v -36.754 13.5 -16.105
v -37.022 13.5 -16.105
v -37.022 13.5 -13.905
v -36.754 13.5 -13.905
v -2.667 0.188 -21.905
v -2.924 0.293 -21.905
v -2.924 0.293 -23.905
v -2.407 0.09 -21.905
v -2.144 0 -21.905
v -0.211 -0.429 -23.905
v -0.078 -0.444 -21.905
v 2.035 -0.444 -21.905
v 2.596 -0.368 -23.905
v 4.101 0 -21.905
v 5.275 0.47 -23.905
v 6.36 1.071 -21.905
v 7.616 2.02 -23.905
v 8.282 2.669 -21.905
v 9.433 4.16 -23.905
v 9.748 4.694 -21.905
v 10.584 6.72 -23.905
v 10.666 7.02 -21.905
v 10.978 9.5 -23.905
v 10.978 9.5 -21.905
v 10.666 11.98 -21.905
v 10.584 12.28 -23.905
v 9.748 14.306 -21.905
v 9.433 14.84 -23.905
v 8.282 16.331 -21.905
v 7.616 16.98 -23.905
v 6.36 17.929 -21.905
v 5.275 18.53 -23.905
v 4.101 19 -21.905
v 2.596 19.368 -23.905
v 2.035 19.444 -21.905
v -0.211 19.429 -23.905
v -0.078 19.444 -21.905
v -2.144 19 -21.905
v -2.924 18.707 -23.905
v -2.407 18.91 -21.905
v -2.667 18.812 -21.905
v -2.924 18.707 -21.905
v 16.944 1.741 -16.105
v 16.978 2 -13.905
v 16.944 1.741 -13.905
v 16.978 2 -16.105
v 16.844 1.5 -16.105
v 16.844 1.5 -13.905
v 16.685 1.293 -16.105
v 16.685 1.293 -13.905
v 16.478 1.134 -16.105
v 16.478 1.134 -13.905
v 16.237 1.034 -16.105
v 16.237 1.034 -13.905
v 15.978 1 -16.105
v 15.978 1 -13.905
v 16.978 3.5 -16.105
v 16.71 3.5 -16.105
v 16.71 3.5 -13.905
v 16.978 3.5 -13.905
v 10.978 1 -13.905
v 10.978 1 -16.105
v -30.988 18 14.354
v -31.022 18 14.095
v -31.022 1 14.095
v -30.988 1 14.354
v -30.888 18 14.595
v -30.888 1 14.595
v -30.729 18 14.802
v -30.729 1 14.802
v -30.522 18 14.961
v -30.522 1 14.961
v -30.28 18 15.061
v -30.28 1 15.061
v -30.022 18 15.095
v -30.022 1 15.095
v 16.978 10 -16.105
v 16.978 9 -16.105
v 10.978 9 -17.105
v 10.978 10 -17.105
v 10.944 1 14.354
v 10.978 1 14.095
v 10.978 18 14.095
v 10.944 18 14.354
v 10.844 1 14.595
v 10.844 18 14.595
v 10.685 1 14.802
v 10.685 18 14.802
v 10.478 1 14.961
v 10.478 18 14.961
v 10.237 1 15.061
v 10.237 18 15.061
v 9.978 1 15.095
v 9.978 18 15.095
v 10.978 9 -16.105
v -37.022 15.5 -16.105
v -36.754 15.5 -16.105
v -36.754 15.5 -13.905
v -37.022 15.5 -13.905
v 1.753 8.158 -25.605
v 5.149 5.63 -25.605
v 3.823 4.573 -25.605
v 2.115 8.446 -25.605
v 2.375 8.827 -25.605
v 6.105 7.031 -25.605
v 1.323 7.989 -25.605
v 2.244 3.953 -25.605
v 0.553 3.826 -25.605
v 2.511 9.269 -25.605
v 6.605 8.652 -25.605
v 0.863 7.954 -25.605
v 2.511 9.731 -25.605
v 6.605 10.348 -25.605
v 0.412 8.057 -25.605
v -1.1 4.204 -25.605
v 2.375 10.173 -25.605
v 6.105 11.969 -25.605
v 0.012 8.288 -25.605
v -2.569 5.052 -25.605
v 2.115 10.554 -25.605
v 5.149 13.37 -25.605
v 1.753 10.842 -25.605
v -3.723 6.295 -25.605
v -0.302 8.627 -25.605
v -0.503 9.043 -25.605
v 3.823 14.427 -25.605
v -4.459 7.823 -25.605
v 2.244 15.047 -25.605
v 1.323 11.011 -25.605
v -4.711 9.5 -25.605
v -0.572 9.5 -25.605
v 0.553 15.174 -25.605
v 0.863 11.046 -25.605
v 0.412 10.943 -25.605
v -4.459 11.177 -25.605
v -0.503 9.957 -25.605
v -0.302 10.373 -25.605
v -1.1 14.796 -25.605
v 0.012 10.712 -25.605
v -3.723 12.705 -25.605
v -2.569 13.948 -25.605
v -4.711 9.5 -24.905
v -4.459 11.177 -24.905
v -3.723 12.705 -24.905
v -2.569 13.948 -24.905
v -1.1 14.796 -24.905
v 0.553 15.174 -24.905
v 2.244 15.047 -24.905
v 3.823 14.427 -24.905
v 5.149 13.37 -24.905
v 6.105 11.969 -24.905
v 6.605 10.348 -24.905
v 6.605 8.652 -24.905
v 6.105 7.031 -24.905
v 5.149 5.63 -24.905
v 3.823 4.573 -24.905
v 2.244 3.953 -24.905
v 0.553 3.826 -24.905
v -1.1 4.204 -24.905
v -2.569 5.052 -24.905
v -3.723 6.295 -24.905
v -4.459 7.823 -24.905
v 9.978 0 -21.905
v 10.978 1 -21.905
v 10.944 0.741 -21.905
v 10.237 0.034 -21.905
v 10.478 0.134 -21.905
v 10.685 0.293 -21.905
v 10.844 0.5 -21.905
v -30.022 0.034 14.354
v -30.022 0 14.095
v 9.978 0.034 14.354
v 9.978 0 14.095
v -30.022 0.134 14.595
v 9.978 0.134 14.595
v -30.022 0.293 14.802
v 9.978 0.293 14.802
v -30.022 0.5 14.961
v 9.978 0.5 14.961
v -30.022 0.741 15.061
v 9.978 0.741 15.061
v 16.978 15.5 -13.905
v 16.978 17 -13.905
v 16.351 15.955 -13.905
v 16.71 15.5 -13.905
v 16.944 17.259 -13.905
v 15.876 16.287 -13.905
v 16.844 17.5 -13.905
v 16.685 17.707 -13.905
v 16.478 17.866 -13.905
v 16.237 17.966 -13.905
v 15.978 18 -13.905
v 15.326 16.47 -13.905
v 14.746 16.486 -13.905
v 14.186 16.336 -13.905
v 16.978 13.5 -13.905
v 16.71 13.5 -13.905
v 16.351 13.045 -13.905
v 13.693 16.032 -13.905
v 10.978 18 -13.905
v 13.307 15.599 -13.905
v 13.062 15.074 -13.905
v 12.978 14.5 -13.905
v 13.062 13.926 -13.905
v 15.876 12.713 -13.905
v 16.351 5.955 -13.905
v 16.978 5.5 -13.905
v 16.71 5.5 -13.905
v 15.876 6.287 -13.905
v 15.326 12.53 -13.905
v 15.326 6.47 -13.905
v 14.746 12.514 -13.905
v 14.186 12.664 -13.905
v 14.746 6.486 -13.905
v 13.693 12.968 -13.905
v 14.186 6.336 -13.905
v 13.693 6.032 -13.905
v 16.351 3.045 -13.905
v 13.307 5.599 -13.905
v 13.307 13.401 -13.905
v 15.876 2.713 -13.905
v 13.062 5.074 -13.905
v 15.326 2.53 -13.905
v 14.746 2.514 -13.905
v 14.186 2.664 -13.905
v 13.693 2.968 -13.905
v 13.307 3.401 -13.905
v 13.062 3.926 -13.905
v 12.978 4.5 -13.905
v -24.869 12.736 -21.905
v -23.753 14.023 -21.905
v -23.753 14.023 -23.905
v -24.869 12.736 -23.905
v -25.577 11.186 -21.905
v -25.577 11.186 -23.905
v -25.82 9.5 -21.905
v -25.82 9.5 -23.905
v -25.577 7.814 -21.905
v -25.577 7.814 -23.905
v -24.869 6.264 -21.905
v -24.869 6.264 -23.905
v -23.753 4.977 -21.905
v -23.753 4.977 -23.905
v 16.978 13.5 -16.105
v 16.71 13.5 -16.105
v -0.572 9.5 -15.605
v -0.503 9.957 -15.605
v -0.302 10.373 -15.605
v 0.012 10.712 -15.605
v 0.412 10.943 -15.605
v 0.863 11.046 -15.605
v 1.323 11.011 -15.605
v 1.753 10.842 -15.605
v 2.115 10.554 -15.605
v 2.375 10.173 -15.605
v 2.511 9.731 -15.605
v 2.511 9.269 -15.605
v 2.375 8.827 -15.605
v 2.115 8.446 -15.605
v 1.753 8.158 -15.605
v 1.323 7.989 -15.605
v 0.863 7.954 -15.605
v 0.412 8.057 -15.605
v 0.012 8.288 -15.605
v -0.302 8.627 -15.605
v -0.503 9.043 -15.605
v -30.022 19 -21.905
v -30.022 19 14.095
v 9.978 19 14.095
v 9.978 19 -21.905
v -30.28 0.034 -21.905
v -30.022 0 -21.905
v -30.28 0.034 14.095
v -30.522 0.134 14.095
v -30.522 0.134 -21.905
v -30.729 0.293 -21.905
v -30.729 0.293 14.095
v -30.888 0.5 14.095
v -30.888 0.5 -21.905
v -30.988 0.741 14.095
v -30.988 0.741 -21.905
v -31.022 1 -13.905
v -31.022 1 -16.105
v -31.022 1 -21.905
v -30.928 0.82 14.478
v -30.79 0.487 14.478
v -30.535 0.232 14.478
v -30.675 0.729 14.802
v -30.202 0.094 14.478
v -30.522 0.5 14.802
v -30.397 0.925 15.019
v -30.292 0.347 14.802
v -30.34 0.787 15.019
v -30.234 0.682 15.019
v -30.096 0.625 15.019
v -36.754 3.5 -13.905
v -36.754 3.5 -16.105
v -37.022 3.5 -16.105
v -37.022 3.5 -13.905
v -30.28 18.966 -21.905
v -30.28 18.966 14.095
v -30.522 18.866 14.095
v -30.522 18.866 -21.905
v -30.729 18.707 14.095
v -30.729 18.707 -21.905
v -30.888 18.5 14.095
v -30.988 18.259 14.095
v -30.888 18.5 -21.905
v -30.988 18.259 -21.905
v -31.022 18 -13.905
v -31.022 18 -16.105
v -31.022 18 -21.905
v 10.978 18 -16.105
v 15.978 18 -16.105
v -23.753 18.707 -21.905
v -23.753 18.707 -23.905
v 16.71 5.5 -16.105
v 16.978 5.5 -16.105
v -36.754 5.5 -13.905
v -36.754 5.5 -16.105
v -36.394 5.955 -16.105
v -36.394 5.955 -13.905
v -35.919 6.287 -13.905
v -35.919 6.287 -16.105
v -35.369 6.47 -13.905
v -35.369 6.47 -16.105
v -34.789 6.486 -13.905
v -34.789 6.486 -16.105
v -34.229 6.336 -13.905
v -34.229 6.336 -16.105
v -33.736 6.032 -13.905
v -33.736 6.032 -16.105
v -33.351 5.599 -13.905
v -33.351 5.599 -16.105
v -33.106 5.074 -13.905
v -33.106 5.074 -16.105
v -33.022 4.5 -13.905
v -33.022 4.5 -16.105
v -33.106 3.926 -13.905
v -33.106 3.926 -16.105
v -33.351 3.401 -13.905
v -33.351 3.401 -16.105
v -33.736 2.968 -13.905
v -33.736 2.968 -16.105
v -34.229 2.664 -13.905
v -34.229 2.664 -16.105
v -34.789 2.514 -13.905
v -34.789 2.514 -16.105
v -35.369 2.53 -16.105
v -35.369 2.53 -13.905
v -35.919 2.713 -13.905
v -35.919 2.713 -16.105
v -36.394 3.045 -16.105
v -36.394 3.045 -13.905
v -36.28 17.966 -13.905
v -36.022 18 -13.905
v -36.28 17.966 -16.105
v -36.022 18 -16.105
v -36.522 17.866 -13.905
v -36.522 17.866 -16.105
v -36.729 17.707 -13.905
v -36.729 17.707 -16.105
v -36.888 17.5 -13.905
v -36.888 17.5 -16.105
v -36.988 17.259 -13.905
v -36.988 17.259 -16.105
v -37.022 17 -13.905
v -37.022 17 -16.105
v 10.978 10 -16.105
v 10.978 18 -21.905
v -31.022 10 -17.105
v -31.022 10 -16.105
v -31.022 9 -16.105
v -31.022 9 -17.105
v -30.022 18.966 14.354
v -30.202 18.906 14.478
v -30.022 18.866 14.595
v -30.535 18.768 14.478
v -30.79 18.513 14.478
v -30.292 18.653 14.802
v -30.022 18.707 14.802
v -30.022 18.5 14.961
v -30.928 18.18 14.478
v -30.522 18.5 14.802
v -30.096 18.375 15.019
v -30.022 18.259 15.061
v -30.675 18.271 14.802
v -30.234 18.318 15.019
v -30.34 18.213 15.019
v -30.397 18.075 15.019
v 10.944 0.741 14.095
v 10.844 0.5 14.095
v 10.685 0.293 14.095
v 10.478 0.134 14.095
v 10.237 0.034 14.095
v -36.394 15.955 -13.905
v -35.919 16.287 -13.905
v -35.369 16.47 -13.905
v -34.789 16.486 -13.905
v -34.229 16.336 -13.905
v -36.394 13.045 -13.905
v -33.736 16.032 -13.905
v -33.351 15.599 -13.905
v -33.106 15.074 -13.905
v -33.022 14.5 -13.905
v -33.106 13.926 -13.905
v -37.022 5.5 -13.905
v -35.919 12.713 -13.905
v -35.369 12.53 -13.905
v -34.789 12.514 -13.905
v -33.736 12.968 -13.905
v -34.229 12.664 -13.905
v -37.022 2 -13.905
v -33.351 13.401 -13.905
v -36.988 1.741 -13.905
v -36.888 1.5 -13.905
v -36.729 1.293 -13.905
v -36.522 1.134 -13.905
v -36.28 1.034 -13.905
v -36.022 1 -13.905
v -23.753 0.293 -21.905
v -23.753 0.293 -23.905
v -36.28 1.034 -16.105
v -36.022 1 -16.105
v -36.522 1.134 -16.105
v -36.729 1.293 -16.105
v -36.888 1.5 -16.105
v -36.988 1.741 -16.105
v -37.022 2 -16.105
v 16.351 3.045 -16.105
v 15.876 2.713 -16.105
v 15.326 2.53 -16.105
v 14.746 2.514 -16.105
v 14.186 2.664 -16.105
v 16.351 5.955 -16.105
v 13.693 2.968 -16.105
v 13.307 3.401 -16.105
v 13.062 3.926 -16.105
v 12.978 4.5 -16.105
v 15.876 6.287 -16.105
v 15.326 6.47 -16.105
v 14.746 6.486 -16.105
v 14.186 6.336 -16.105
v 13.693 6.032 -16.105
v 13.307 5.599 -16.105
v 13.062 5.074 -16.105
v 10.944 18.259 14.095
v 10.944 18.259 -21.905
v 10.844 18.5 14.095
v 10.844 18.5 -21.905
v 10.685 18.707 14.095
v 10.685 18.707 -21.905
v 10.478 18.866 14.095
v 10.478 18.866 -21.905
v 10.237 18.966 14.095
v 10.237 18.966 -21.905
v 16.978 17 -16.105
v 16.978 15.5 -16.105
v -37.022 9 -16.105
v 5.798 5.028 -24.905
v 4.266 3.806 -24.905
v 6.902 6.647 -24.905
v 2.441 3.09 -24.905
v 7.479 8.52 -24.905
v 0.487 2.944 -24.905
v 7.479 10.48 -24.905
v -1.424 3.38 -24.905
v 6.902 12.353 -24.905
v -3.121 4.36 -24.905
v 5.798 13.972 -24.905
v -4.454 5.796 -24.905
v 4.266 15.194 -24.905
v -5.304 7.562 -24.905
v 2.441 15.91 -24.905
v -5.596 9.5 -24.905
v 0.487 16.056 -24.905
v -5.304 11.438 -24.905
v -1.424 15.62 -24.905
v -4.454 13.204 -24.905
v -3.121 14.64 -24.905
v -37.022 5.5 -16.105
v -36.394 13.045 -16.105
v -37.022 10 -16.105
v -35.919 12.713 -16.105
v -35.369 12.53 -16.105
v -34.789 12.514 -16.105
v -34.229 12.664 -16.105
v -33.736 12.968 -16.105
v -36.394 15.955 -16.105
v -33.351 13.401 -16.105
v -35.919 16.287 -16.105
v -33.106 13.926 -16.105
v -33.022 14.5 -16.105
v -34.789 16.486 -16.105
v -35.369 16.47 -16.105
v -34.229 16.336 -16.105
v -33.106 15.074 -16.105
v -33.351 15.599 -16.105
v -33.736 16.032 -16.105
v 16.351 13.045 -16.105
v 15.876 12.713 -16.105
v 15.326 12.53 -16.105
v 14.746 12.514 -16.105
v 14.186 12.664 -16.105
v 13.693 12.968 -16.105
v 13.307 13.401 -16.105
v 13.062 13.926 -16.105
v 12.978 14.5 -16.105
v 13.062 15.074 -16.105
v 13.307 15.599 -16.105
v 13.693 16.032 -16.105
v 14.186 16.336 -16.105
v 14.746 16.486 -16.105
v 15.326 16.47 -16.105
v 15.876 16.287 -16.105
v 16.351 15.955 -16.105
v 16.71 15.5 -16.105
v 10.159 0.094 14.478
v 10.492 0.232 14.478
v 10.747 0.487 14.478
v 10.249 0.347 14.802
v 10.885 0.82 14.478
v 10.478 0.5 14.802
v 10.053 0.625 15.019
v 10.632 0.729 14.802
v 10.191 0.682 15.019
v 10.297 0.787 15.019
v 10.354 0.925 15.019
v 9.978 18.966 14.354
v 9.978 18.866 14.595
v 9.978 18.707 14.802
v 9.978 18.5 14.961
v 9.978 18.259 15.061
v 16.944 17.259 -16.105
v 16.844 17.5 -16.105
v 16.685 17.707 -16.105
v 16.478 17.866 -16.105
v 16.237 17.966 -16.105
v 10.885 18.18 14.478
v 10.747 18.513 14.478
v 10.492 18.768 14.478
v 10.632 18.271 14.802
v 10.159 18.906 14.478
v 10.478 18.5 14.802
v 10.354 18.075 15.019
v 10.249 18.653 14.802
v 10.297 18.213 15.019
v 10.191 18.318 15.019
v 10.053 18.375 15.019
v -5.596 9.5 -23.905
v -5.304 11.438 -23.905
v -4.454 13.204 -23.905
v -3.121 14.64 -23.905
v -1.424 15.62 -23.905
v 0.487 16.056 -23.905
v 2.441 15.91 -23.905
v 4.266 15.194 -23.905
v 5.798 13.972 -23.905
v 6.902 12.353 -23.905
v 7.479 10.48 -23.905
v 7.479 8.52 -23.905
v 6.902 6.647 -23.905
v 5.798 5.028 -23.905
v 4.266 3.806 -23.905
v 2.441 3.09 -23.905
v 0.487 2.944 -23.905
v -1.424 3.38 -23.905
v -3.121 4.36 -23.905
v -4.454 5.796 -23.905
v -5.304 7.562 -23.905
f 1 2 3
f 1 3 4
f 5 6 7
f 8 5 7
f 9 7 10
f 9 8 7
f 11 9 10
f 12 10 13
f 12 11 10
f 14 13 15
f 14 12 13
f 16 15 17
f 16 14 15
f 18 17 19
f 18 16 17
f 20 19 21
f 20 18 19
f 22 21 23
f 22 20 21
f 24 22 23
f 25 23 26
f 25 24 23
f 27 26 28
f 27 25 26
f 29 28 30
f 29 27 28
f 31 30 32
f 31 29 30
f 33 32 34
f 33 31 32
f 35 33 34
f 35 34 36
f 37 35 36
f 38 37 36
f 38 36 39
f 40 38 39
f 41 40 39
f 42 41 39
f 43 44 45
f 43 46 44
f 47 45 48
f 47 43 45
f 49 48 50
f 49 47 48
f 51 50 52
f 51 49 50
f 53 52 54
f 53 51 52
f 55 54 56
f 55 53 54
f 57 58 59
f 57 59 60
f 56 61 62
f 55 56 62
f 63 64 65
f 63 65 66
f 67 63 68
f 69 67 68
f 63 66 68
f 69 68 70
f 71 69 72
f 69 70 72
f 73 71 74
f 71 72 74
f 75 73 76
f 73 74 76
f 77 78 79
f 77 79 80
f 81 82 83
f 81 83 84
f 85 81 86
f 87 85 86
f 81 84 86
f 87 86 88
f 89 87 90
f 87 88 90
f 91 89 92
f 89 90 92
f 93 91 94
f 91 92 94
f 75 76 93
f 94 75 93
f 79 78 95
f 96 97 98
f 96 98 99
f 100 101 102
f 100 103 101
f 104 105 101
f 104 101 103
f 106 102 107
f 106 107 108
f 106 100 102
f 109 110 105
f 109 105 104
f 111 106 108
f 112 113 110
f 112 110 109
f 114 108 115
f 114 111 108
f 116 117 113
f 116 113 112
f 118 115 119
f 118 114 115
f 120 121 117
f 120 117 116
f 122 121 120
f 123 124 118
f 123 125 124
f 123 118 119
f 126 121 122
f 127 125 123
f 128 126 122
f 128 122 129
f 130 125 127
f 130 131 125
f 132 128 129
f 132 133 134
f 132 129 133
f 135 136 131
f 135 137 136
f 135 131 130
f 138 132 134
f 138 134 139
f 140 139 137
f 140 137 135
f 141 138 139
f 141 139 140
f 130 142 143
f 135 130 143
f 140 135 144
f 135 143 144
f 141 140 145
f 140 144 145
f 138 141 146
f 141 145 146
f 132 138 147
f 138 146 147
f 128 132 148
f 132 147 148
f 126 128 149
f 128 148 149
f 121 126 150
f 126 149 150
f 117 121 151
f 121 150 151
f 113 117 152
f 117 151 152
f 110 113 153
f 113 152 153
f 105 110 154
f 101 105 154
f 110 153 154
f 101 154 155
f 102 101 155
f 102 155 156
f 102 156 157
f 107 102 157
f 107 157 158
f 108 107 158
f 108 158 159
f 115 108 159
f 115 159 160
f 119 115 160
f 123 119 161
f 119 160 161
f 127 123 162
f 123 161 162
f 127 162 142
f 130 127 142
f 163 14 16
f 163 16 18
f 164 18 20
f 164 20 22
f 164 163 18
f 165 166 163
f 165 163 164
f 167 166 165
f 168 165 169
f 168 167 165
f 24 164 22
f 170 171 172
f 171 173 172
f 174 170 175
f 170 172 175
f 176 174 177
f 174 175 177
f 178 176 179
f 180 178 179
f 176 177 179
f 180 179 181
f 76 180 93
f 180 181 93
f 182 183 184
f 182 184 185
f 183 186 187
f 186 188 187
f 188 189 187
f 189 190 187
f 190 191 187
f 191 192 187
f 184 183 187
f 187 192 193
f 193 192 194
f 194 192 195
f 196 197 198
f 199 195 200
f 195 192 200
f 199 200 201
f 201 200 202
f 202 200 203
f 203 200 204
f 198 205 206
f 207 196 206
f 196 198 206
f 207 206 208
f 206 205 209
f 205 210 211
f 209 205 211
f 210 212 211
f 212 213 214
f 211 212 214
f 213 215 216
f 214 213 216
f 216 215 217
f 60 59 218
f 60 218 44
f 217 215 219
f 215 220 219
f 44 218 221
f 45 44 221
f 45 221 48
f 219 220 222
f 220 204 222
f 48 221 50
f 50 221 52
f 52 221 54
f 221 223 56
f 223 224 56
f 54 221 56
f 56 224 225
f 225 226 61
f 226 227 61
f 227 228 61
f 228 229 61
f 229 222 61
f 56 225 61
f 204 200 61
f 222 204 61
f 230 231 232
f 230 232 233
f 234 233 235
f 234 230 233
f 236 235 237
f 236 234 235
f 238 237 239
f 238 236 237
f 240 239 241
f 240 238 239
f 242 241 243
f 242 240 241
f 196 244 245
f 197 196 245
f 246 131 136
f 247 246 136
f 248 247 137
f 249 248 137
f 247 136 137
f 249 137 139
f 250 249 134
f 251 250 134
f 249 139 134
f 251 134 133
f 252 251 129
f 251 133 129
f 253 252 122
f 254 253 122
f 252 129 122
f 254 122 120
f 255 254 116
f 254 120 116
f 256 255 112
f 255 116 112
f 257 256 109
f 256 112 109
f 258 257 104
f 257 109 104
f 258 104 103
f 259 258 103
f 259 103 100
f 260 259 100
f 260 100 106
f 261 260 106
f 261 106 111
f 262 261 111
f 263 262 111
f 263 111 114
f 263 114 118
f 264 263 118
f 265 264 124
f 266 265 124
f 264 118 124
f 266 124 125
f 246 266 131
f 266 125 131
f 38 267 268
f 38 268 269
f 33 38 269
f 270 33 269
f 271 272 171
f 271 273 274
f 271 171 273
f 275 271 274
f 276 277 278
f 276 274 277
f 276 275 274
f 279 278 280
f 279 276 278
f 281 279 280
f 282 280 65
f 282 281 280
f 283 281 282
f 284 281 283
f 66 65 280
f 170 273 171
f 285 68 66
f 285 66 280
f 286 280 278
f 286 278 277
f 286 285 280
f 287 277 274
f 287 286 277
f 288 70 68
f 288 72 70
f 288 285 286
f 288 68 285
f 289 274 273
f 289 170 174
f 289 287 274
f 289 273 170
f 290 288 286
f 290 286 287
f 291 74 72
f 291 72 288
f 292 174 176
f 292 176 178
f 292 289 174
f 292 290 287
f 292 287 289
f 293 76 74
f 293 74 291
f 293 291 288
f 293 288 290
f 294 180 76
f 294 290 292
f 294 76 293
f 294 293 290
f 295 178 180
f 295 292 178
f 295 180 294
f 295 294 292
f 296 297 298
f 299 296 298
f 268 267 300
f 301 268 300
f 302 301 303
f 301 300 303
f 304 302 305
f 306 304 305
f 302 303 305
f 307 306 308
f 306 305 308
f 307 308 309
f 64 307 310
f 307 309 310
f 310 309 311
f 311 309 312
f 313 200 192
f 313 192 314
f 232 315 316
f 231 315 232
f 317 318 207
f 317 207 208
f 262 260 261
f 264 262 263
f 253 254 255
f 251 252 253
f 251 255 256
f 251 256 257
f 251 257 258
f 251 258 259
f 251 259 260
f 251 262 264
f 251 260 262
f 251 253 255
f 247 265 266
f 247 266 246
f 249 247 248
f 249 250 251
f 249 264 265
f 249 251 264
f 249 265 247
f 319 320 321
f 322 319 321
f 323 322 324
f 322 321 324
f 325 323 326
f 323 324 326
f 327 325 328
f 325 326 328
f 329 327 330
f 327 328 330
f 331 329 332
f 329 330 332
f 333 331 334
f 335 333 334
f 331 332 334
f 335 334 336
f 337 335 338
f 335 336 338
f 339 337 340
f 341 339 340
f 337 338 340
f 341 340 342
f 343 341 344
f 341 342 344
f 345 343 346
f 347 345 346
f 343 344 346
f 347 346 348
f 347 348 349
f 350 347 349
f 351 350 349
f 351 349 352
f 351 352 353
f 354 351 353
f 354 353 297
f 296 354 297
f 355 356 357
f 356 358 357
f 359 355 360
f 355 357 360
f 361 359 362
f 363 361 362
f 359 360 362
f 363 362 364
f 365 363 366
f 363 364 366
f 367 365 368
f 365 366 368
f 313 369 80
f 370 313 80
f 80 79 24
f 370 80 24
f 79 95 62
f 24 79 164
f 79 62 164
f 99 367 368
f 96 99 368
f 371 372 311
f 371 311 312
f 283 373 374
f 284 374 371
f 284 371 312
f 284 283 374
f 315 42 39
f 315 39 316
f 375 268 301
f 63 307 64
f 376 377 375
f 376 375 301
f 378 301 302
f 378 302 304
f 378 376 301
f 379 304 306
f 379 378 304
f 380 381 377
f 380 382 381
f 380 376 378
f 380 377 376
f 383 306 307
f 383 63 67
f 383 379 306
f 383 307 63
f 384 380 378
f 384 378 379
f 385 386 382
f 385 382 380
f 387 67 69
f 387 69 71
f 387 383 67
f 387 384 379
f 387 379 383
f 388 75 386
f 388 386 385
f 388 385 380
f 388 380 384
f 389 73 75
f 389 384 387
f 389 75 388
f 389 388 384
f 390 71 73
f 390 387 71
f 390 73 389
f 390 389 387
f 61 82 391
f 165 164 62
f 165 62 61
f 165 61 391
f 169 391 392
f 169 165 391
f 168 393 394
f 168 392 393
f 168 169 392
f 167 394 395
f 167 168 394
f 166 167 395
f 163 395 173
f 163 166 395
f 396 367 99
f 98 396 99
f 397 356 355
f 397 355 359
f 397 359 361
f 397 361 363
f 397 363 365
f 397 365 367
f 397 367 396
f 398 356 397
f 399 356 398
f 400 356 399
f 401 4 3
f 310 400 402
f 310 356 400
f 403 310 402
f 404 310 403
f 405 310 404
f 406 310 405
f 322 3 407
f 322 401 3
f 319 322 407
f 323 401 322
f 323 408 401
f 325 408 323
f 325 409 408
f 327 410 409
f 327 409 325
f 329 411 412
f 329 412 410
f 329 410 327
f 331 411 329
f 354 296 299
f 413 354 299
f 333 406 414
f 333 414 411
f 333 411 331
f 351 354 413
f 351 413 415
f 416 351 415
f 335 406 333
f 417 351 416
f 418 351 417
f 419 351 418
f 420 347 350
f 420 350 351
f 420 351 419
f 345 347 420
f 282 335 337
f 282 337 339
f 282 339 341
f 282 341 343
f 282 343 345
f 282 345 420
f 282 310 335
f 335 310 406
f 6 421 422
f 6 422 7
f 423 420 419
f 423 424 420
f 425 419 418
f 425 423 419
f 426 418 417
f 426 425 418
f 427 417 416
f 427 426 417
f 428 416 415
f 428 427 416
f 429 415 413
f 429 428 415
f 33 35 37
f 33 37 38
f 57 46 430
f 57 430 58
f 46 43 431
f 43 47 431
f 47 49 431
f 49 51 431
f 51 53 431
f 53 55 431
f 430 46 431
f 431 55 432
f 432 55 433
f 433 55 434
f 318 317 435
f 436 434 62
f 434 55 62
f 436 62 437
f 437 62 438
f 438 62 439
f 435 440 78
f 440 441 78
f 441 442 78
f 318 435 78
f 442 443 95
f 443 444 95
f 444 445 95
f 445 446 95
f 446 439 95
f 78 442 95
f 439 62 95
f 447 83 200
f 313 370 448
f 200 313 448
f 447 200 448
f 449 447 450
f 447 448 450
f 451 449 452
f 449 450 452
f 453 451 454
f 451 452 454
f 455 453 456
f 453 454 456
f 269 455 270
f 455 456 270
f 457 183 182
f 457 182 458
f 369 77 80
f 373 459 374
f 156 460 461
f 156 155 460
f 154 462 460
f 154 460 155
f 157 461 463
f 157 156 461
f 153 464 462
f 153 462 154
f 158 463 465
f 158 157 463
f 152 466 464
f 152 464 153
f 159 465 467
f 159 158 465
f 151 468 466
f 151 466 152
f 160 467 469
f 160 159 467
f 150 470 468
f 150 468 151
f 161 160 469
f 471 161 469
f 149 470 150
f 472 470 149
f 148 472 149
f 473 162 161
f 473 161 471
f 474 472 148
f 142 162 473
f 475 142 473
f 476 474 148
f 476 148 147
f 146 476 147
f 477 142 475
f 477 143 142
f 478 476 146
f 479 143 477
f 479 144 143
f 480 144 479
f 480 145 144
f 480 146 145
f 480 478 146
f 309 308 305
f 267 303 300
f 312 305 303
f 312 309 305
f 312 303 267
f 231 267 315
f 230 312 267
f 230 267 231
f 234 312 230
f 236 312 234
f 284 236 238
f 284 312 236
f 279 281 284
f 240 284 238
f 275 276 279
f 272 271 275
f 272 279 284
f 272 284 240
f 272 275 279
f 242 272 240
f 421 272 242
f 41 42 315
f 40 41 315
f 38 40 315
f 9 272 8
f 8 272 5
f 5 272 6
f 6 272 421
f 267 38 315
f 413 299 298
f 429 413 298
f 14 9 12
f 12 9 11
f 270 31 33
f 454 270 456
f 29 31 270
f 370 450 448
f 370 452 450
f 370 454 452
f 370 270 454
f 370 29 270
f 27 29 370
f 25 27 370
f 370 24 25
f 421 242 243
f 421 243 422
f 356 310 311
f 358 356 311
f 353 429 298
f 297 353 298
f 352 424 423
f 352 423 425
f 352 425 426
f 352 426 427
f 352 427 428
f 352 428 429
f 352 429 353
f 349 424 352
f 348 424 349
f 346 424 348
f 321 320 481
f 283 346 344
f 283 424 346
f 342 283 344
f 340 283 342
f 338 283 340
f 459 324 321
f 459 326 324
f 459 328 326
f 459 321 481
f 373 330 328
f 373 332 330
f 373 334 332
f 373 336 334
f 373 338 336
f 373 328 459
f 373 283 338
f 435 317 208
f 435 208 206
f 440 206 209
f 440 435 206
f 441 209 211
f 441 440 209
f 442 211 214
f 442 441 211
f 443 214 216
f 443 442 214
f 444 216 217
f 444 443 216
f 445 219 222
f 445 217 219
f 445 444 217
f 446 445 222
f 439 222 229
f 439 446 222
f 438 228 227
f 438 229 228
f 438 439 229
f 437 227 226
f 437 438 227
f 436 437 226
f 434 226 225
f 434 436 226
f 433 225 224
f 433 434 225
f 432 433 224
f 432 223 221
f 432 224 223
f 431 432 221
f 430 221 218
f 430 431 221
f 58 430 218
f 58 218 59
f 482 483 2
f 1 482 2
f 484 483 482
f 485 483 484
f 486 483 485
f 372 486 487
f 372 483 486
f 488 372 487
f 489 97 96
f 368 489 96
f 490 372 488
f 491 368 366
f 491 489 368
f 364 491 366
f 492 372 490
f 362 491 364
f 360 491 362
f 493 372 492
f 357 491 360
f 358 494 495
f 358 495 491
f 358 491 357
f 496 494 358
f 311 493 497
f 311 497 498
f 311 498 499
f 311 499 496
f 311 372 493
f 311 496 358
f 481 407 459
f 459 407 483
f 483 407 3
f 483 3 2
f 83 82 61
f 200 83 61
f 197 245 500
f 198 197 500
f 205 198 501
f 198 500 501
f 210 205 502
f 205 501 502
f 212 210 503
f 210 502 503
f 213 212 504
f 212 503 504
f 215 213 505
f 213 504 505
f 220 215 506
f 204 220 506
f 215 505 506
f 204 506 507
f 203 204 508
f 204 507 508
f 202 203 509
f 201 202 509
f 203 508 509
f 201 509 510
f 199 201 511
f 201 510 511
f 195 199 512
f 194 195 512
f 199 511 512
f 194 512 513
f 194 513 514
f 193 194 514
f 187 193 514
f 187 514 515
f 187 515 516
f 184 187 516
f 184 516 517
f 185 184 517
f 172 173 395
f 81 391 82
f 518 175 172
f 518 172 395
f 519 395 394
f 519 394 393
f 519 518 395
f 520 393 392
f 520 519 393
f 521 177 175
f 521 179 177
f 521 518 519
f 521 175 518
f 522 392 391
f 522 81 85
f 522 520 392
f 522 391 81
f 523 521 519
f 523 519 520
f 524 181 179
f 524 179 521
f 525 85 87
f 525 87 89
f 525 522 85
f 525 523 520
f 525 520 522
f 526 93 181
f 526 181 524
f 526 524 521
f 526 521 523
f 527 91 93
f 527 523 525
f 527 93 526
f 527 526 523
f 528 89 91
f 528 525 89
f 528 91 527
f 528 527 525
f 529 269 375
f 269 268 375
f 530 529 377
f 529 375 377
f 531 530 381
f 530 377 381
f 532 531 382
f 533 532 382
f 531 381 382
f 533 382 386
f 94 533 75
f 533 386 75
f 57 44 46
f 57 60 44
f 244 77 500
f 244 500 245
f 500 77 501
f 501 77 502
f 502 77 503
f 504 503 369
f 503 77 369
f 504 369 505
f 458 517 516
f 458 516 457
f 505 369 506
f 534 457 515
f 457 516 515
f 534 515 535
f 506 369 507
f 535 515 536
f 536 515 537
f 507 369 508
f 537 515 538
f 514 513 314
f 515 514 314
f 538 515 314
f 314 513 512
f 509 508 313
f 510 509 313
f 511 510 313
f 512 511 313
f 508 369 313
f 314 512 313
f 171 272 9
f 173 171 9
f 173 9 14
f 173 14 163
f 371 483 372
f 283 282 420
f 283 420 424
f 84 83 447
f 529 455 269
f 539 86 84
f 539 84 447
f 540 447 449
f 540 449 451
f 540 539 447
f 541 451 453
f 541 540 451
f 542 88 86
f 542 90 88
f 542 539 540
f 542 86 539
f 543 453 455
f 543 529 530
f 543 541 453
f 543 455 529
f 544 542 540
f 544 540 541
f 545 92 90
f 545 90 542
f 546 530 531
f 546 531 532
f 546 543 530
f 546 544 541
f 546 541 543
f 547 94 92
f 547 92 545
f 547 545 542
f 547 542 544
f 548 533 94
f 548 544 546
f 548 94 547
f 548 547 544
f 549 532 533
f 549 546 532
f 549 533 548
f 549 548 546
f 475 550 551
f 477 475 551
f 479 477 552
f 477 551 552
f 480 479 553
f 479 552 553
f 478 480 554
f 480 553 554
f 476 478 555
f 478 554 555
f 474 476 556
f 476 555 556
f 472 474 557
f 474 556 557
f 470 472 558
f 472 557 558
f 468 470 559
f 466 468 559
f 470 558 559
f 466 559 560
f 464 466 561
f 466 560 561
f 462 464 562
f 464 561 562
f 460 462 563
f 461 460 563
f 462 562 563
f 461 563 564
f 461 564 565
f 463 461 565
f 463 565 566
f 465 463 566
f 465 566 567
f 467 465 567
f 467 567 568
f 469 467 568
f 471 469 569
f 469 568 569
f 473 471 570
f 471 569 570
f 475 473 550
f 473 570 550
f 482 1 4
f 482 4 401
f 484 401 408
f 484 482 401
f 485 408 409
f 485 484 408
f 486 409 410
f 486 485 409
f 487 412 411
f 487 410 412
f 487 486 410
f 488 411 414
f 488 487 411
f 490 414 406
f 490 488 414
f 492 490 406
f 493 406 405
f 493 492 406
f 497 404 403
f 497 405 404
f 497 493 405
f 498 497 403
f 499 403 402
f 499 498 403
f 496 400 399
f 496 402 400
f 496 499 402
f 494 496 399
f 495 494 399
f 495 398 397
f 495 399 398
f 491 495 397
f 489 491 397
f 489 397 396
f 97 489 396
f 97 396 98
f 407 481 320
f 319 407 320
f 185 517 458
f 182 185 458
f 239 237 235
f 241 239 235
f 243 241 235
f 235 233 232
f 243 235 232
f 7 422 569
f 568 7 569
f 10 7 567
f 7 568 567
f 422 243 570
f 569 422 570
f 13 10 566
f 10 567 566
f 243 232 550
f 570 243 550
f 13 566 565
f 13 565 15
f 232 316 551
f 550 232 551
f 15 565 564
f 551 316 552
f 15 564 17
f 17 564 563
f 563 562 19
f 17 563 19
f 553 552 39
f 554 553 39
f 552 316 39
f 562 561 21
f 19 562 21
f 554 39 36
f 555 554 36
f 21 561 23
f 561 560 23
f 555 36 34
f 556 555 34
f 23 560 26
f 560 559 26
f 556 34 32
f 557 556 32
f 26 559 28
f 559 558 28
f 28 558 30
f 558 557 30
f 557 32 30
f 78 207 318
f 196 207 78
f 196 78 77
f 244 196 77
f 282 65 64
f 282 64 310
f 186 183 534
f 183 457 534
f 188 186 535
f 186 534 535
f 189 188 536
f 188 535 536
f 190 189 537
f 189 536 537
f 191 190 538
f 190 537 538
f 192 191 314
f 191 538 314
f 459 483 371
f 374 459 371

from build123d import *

# Parameters (mm, degrees)
SKETCH2_W            = 42
SKETCH2_H            = 37
BOSS_EXTRUDE1_DEPTH  = 19
FILLET1_R            = 1
FILLET2_R            = 1
SKETCH3_W            = 2.2
SKETCH3_H            = 8.5
BOSS_EXTRUDE2_DEPTH  = 6
SKETCH4_W            = 6
SKETCH4_H            = 1
BOSS_EXTRUDE3_DEPTH  = 1
CHAMFER1_SIZE2       = 1
CHAMFER1_SIZE        = 6
FILLET3_R            = 1
CUT_EXTRUDE1_DEPTH   = 6
FILLET3_OF_MIRROR9_R = 1
CHAMFER2_SIZE        = 1
CHAMFER2_SIZE_2      = 6
FILLET4_R            = 1
BOSS_EXTRUDE4_DEPTH  = 2
SKETCH9_R            = 6.574433214
BOSS_EXTRUDE5_DEPTH  = 1
SKETCH10_R           = 5.689687475
BOSS_EXTRUDE6_DEPTH  = 0.7
SKETCH11_R           = 1.55
CUT_EXTRUDE2_DEPTH   = 10


# Some blends are built 0.0001 mm under size
with BuildPart() as part:
    # Sketch2 → Boss-Extrude1 (new body)
    with BuildSketch(Plane(origin=(0, 0, 0), x_dir=(1, 0, 0), z_dir=(0, 1, 0))):
        with Locations((-10.021609405, 3.404712932)):
            Rectangle(SKETCH2_W, SKETCH2_H)
    extrude(amount=BOSS_EXTRUDE1_DEPTH)

    # Fillet1
    fillet1_edges = [part.edges().sort_by_distance(p)[0] for p in [
        (10.978390595, 19, -3.404712932),
    ]]
    fillet(fillet1_edges, radius=FILLET1_R)

    # Fillet2
    fillet2_edges = [part.edges().sort_by_distance(p)[0] for p in [
        (-31.021609405, 19, -3.404712932),
        (10.978390595, 0, -3.404712932),
        (-31.021609405, 0, -3.404712932),
    ]]
    fillet(fillet2_edges, radius=FILLET2_R)

    # Sketch3 → Boss-Extrude2 (add)
    with BuildSketch(Plane(origin=(10.978390595, 0, 0), x_dir=(0, 0, -1), z_dir=(1, 0, 0))):
        with Locations((15.004712932, 5.25)):
            Rectangle(SKETCH3_W, SKETCH3_H)
        with Locations((15.004712932, 13.75)):
            Rectangle(SKETCH3_W, SKETCH3_H)
    boss_extrude2 = extrude(amount=BOSS_EXTRUDE2_DEPTH)

    # Sketch4 → Boss-Extrude3 (add)
    with BuildSketch(Plane(origin=(0, 0, -16.104712932), x_dir=(-1, 0, 0), z_dir=(0, 0, -1))):
        with Locations((-13.978390595, 9.5)):
            Rectangle(SKETCH4_W, SKETCH4_H)
    boss_extrude3 = extrude(amount=BOSS_EXTRUDE3_DEPTH)

    # Chamfer1
    chamfer1_edges = [part.edges().sort_by_distance(p)[0] for p in [
        (16.978390595, 9.5, -17.104712932),
    ]]
    chamfer1_side = [part.faces().sort_by_distance(p)[0] for p in [
        (16.958390595, 9.5, -17.104712932),
    ]]
    chamfer(chamfer1_edges, length=CHAMFER1_SIZE - 0.0001, length2=CHAMFER1_SIZE2 - 0.0001, reference=chamfer1_side[0])  # a hair under: the kernel refuses the full size

    # Fillet3
    fillet3_edges = [part.edges().sort_by_distance(p)[0] for p in [
        (16.978390595, 18, -15.004712932),
        (16.978390595, 1, -15.004712932),
    ]]
    fillet(fillet3_edges, radius=FILLET3_R)

    # Sketch5 → Cut-Extrude1 (cut)
    with BuildSketch(Plane(origin=(0, 0, -16.104712932), x_dir=(-1, 0, 0), z_dir=(0, 0, -1))):
        with BuildLine():
            Line((-16.978390595, 15.5), (-16.978390595, 13.5))
            Line((-16.978390595, 13.5), (-16.710441403, 13.5))
            ThreePointArc((-16.710441403, 13.5), (-12.978390595, 14.5), (-16.710441403, 15.5))
            Line((-16.710441403, 15.5), (-16.978390595, 15.5))
        make_face()
        with BuildLine():
            Line((-16.978390595, 3.5), (-16.978390595, 5.5))
            Line((-16.978390595, 5.5), (-16.710441403, 5.5))
            ThreePointArc((-16.710441403, 5.5), (-12.978390595, 4.5), (-16.710441403, 3.5))
            Line((-16.710441403, 3.5), (-16.978390595, 3.5))
        make_face()
    cut_extrude1 = extrude(amount=-CUT_EXTRUDE1_DEPTH, mode=Mode.SUBTRACT)

    # Mirror9: Boss-Extrude2, Boss-Extrude3, Cut-Extrude1 across plane
    add(boss_extrude2.mirror(Plane(origin=(-10.021609405, 0, 0), x_dir=(0, 0, 1), z_dir=(1, 0, 0))))
    add(boss_extrude3.mirror(Plane(origin=(-10.021609405, 0, 0), x_dir=(0, 0, 1), z_dir=(1, 0, 0))))
    add(cut_extrude1.mirror(Plane(origin=(-10.021609405, 0, 0), x_dir=(0, 0, 1), z_dir=(1, 0, 0))), mode=Mode.SUBTRACT)

    # Fillet3 of Mirror9
    fillet3_of_mirror9_edges = [part.edges().sort_by_distance(p)[0] for p in [
        (-37.021609405, 18, -15.004712932),
        (-37.021609405, 1, -15.004712932),
    ]]
    fillet(fillet3_of_mirror9_edges, radius=FILLET3_OF_MIRROR9_R)

    # Chamfer2
    # the kernel refuses this chamfer: 6, 1 mm, written as the material it takes off along each edge
    with BuildSketch(Plane(origin=(-37.021609405, 25.592148365, -17.104712932), x_dir=(-0.22206223681747272, 0, 0.9750324932942598), z_dir=(0, -1, 0))) as chamfer2_piece_1:
        Polygon((CHAMFER2_SIZE * 0.975032493294, -CHAMFER2_SIZE * 0.222062236817), (-CHAMFER2_SIZE_2 * 0.222062236817, -CHAMFER2_SIZE_2 * 0.975032493294), (0, 0), align=None)
    extrude(amount=32.18429673, mode=Mode.SUBTRACT)

    # Fillet4
    fillet4_edges = [part.edges().sort_by_distance(p)[0] for p in [
        (10.978390595, 9.5, 15.095287068),
        (10.685497376, 18.707106781, 15.095287068),
        (-10.021609405, 19, 15.095287068),
        (-31.021609405, 9.5, 15.095287068),
        (-10.021609405, 0, 15.095287068),
        (10.685497376, 0.292893219, 15.095287068),
        (-30.728716186, 0.292893219, 15.095287068),
        (-30.728716186, 18.707106781, 15.095287068),
    ]]
    fillet(fillet4_edges, radius=FILLET4_R)

    # Sketch8 → Boss-Extrude4 (add)
    with BuildSketch(Plane(origin=(0, 0, -21.904712932), x_dir=(-1, 0, 0), z_dir=(0, 0, -1))):
        with BuildLine():
            Line((2.924068209, 18.707106781), (23.752988448, 18.707106781))
            Line((23.752988448, 18.707106781), (23.752988448, 14.023415458))
            ThreePointArc((23.752988448, 14.023415458), (25.81960193, 9.5), (23.752988448, 4.976584542))
            Line((23.752988448, 4.976584542), (23.752988448, 0.292893219))
            Line((23.752988448, 0.292893219), (2.924068209, 0.292893219))
            ThreePointArc((2.924068209, 0.292893219), (-10.978390595, 9.5), (2.924068209, 18.707106781))
        make_face()
    extrude(amount=BOSS_EXTRUDE4_DEPTH)

    # Sketch9 → Boss-Extrude5 (add)
    with BuildSketch(Plane(origin=(0, 0, -23.904712932), x_dir=(-1, 0, 0), z_dir=(0, 0, -1))):
        with Locations((-0.978390595, 9.5)):
            Circle(SKETCH9_R)
    extrude(amount=BOSS_EXTRUDE5_DEPTH)

    # Sketch10 → Boss-Extrude6 (add)
    with BuildSketch(Plane(origin=(0, 0, -24.904712932), x_dir=(-1, 0, 0), z_dir=(0, 0, -1))):
        with Locations((-0.978390595, 9.5)):
            Circle(SKETCH10_R)
    extrude(amount=BOSS_EXTRUDE6_DEPTH)

    # Sketch11 → Cut-Extrude2 (cut)
    with BuildSketch(Plane(origin=(0, 0, -25.604712932), x_dir=(-1, 0, 0), z_dir=(0, 0, -1))):
        with Locations((-0.978390595, 9.5)):
            Circle(SKETCH11_R)
    extrude(amount=-CUT_EXTRUDE2_DEPTH, mode=Mode.SUBTRACT)


solid = part.part
